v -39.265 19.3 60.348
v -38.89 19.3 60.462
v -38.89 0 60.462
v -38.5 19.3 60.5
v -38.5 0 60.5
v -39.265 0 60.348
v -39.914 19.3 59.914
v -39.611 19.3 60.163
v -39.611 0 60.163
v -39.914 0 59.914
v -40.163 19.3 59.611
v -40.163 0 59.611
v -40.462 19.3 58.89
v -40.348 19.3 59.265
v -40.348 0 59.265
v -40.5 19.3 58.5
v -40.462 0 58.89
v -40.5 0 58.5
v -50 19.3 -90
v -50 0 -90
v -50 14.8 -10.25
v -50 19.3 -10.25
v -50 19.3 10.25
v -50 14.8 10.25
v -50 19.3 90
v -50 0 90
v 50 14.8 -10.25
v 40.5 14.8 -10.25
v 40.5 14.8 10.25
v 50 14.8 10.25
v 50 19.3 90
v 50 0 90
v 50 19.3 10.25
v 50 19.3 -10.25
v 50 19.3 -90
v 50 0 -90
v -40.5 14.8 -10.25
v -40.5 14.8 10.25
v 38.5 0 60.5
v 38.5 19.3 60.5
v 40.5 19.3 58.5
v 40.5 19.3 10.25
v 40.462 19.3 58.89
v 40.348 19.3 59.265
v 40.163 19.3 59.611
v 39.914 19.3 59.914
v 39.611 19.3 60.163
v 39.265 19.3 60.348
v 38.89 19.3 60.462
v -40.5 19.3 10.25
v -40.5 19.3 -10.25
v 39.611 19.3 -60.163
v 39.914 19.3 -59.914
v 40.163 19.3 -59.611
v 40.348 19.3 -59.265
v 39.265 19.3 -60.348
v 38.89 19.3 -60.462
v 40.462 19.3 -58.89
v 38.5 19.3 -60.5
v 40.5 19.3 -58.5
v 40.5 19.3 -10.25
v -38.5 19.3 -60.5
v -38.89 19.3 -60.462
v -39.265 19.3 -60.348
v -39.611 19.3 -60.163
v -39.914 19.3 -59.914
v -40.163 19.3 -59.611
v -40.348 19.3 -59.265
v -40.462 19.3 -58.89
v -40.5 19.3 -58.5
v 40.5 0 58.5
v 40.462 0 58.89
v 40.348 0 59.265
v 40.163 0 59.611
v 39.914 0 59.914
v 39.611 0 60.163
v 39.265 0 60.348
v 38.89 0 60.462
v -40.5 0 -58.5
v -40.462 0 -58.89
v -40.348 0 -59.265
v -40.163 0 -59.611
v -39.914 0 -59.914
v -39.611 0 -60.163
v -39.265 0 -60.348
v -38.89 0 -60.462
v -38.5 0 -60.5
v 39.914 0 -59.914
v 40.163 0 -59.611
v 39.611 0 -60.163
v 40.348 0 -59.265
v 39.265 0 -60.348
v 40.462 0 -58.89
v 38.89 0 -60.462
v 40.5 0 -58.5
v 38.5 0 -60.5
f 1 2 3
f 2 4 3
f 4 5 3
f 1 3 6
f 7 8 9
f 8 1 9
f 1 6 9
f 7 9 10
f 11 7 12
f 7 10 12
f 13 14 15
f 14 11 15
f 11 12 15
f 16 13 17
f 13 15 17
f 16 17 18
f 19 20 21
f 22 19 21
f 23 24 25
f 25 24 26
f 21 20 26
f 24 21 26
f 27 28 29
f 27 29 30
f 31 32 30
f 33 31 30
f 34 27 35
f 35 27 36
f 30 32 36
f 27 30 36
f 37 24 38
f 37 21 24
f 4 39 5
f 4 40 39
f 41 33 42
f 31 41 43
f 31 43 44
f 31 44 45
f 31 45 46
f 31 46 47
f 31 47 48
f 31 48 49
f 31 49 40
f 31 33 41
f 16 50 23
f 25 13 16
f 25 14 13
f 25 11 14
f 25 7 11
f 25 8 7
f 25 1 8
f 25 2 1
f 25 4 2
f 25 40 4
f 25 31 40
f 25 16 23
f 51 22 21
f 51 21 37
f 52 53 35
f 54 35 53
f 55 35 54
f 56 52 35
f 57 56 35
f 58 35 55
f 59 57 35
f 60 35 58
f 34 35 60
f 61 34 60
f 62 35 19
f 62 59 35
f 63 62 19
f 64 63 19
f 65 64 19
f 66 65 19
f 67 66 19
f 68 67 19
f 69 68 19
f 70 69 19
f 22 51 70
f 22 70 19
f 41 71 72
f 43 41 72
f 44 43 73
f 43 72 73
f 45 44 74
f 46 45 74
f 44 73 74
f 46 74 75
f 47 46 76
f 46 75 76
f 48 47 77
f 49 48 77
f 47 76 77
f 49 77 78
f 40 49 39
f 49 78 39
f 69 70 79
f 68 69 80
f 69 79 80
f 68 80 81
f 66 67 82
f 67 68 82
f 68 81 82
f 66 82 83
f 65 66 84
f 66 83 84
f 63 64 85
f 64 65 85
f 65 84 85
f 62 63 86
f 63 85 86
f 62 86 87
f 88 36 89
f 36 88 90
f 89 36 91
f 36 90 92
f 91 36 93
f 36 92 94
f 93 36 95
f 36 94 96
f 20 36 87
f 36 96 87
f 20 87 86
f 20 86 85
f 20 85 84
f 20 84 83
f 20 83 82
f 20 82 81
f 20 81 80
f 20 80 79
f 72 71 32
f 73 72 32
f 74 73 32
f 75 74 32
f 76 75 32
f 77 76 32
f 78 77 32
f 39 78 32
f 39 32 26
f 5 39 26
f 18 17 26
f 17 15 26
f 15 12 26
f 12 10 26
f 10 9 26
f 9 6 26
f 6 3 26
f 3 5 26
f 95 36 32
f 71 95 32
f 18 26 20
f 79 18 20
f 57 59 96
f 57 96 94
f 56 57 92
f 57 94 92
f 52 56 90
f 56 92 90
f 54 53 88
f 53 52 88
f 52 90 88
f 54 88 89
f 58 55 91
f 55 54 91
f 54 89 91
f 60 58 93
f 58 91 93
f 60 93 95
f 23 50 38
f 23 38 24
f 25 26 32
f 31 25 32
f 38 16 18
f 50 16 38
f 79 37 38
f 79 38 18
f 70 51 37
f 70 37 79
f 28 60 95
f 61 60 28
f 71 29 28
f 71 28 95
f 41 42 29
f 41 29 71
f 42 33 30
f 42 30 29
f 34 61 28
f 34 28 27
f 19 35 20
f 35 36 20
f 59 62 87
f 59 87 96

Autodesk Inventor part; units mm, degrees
ref_plane "YZ Plane" through (0, 0, 0) normal (1, 0, 0) x (0, 1, 0)
ref_plane "XZ Plane" through (0, 0, 0) normal (0, 1, 0) x (-1, 0, 0)
ref_plane "XY Plane" through (0, 0, 0) normal (0, 0, 1) x (1, 0, 0)
sketch "Sketch1" plane through (0, 0, 0) normal (0, 1, 0) x (-1, 0, 0)
  line L0 (50, 90) -> (-50, 90)
  line L1 (-50, 90) -> (-50, -90)
  line L2 (-50, -90) -> (50, -90)
  line L3 (50, -90) -> (50, 90)
  point P0 (0, 0)
  dimension "d0" = 100
  dimension "d1" = 180
extrude "Extrusion1" add sketch "Sketch1" along normal blind 19.3
sketch "Sketch2" plane through (0, 19.3, 0) normal (0, 1, 0) x (1, 0, 0)
  line L0 (40.5, -60.5) -> (-40.5, -60.5)
  line L1 (-40.5, -60.5) -> (-40.5, 60.5)
  line L2 (-40.5, 60.5) -> (40.5, 60.5)
  line L3 (40.5, 60.5) -> (40.5, -60.5)
  line L4 (40.5, -60.5) -> (-40.5, 60.5) construction
  line L5 (-40.5, -60.5) -> (40.5, 60.5) construction
  point P0 (0, 0)
  dimension "d4" = 81
  dimension "d5" = 121
extrude "Extrusion2" cut sketch "Sketch2" against normal blind 19.3
fillet "Fillet1" radius 2 4 edges at (-40.5, 9.65, -60.5) (-40.5, 9.65, 60.5) (40.5, 9.65, 60.5) (40.5, 9.65, -60.5)
sketch "Sketch3" plane through (0, 19.3, 0) normal (0, 1, 0) x (1, 0, 0)
  line L0 (-50, 90) -> (-50, -90) projected
  line L1 (-40.5, -58.5) -> (-40.5, 58.5) projected
  line L2 (-50, 10.25) -> (-40.5, 10.25)
  line L3 (-40.5, 10.25) -> (-40.5, -10.25)
  line L4 (-40.5, -10.25) -> (-50, -10.25)
  line L5 (-50, -10.25) -> (-50, 10.25)
  line L6 (40.5, 58.5) -> (40.5, -58.5) projected
  line L7 (50, -90) -> (50, 90) projected
  line L8 (40.5, 10.25) -> (50, 10.25)
  line L9 (50, 10.25) -> (50, -10.25)
  line L10 (50, -10.25) -> (40.5, -10.25)
  line L11 (40.5, -10.25) -> (40.5, 10.25)
  point P0 (0, 0)
  dimension "d9" = 20.5
extrude "Extrusion3" cut sketch "Sketch3" against normal blind 4.5
properties part number "Cutter-bed"
